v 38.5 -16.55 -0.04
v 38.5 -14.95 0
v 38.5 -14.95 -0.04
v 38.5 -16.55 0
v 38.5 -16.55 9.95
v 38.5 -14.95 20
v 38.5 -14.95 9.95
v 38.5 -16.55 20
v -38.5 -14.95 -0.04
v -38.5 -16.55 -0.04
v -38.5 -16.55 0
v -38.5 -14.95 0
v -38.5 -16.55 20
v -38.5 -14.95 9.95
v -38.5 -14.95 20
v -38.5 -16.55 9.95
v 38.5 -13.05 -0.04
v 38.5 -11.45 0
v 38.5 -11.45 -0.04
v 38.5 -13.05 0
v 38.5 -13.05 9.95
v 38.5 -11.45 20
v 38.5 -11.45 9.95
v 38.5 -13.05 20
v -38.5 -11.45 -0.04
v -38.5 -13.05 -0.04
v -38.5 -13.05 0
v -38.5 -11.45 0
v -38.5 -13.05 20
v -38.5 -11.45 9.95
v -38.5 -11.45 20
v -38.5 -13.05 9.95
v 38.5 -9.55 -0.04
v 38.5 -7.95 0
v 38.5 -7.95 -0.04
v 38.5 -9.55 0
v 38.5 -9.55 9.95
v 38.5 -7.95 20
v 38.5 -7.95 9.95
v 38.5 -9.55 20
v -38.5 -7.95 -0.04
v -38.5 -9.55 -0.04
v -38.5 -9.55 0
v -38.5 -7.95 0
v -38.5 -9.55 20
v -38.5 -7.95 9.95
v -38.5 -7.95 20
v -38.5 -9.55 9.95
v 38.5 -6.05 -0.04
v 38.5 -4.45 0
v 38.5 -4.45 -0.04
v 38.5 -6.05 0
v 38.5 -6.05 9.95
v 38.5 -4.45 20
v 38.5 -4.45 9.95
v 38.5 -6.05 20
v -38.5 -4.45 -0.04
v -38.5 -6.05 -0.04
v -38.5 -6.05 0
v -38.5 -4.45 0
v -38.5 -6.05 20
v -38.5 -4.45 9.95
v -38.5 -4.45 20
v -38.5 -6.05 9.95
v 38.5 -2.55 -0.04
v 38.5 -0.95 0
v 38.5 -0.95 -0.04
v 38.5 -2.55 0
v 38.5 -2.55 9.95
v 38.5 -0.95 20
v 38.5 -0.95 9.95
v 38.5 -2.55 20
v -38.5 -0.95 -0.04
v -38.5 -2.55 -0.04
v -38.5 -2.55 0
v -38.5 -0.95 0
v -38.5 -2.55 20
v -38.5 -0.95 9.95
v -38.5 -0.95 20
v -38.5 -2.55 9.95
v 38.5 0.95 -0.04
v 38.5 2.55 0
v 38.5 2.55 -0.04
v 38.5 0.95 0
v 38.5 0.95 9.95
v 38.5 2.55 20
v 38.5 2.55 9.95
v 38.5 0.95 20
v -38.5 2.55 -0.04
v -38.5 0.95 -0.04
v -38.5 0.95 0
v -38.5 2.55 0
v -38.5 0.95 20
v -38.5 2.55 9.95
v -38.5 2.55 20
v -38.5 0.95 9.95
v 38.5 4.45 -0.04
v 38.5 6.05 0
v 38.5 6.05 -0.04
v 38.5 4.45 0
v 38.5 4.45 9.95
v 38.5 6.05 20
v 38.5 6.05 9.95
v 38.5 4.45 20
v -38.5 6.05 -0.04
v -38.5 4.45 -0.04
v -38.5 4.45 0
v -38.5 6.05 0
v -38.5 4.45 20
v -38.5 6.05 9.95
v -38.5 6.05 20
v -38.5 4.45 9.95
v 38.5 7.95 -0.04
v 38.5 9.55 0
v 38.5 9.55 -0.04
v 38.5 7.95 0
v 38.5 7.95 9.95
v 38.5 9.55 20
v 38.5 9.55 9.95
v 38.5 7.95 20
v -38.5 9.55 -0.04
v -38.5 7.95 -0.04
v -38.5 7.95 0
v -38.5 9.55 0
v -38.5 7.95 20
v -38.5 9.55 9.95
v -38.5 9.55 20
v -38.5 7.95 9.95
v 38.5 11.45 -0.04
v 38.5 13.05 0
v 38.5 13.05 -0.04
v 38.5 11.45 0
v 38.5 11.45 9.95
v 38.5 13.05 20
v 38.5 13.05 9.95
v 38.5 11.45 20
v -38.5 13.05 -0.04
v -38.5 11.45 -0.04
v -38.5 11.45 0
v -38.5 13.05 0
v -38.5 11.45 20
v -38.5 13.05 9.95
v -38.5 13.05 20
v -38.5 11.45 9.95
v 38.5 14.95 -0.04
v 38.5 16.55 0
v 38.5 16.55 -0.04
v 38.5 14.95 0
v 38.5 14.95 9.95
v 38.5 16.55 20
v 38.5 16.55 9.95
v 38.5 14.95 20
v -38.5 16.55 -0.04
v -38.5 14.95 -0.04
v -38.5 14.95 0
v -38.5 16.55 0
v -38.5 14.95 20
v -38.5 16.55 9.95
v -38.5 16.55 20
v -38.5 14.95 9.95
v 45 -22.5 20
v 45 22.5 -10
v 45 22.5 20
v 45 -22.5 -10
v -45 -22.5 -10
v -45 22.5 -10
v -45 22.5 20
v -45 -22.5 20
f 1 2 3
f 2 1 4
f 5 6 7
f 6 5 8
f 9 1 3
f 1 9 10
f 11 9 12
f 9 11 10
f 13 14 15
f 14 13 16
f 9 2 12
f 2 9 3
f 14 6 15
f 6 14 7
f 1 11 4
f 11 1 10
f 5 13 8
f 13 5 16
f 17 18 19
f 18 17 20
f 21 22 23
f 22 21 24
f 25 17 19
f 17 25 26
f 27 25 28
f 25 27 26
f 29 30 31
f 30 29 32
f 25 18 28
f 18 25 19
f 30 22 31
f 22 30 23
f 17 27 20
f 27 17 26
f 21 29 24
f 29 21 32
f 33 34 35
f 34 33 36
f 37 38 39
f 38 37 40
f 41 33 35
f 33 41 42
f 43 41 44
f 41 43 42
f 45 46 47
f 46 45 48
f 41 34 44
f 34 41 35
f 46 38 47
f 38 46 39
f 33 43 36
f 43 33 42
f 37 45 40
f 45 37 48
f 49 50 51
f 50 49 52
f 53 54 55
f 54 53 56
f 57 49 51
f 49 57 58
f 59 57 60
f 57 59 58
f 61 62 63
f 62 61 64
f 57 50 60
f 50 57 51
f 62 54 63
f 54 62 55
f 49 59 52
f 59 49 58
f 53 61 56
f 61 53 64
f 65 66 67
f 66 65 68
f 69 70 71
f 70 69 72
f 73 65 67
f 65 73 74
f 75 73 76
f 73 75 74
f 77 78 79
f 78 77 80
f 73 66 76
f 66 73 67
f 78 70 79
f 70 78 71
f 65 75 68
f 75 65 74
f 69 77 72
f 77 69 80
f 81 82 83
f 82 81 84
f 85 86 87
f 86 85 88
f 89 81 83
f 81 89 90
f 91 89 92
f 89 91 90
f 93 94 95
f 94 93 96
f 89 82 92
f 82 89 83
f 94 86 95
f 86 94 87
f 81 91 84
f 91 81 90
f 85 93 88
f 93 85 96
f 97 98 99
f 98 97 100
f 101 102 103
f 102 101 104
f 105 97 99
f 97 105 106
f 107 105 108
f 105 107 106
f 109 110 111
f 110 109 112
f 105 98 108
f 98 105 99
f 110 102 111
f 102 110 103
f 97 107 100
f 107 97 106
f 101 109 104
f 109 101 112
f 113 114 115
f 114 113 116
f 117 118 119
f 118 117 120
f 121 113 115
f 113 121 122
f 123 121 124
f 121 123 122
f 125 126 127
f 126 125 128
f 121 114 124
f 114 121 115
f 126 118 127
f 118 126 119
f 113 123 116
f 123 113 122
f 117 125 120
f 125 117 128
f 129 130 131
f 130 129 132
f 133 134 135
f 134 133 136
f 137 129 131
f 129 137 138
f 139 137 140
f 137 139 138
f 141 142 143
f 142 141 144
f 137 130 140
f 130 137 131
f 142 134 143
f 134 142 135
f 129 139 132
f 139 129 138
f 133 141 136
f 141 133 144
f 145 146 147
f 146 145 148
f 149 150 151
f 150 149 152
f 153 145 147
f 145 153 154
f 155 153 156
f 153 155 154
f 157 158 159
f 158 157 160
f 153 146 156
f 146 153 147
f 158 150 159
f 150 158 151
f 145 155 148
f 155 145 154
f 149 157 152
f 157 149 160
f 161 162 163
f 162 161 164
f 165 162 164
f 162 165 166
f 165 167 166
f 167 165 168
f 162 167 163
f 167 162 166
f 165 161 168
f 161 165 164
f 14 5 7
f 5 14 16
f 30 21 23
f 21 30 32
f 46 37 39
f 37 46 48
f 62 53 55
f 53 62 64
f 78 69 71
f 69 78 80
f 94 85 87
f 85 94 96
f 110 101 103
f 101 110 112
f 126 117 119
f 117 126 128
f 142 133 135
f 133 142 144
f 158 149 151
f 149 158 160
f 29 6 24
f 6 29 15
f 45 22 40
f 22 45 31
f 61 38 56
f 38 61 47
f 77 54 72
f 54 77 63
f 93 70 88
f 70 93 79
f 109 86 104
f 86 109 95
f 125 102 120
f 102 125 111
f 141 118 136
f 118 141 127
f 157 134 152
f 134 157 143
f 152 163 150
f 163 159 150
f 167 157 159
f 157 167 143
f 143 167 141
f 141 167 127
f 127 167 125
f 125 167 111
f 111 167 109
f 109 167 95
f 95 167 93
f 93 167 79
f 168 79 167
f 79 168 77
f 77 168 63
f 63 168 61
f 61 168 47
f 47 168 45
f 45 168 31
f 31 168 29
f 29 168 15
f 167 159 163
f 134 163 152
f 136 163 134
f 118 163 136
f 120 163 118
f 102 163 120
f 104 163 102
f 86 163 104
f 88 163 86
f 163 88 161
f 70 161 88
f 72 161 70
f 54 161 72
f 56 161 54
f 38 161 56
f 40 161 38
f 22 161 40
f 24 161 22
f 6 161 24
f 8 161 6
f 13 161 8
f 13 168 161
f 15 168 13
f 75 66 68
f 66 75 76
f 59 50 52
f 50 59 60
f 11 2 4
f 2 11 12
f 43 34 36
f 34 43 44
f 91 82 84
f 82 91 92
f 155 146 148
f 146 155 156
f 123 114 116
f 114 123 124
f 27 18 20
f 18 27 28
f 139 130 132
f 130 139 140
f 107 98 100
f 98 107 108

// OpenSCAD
// --- Dimensions (mm) ---
block_length = 90;      // X dimension of the base block
block_width = 45;       // Y dimension of the base block
block_height = 20;      // Z dimension of the base block

slide_length = 75;      // Length of the slide (X direction)
slide_width = 25;       // Width of the slide (Y direction)
slide_thickness = 1;    // Thickness of the slide (Z direction)

slot_count = 10;         // Number of slots
slot_length = 77;       // Length of the slot (X direction)
slot_width = 1.6;       // Width of the slot (Y direction)
slot_depth = 10;        // Depth of the slot (Z direction)
slot_spacing = 3.5;     // Center-to-center distance between slots (Y direction)

// --- Resolution ---
$fn = 64;

// --- Implementation ---

// The base block
difference() {
    // Main block body
    cube([block_length, block_width, block_height], center = true);

    // Generate the slots
    // We use a loop to create 10 slots.
    // The slots are centered on the block in Y.
    // The total span of the slots is (slot_count - 1) * slot_spacing.
    // We calculate the starting Y position to ensure the group is centered.
    
    for (i = [0 : slot_count - 1]) {
        // Calculate Y position for the center of the current slot
        // Offset is calculated so the group of slots is centered on Y=0
        y_offset = (i * slot_spacing) - ((slot_count - 1) * slot_spacing / 2);
        
        translate([0, y_offset, block_height/2 - slot_depth/2 + 0.01]) {
            cube([slot_length, slot_width, slot_depth + 0.1], center = true);
        }
    }
}

// Note on Orientation:
// The block is centered on the origin (X=0, Y=0, Z=0).
// The bottom face of the block is at Z = -block_height/2.
// To print it resting on the XY plane at Z=0 as requested:
// We translate the whole object up by half the height.

// Re-defining the assembly to follow the "rests on XY plane at Z=0" rule
// We wrap the logic in a module to allow easy translation.

module drying_rack() {
    difference() {
        // Main block body
        cube([block_length, block_width, block_height], center = true);

        // Generate the slots
        for (i = [0 : slot_count - 1]) {
            y_offset = (i * slot_spacing) - ((slot_count - 1) * slot_spacing / 2);
            
            // We translate the slot to the top face. 
            // Top face is at Z = block_height/2.
            // We cut from block_height/2 down to block_height/2 - slot_depth.
            // To ensure a clean cut, we extend the Z slightly.
            translate([0, y_offset, (block_height/2) - (slot_depth/2)]) {
                cube([slot_length, slot_width, slot_depth + 0.1], center = true);
            }
        }
    }
}

// Final assembly positioned at Z=0
translate([0, 0, block_height/2]) {
    drying_rack();
}
